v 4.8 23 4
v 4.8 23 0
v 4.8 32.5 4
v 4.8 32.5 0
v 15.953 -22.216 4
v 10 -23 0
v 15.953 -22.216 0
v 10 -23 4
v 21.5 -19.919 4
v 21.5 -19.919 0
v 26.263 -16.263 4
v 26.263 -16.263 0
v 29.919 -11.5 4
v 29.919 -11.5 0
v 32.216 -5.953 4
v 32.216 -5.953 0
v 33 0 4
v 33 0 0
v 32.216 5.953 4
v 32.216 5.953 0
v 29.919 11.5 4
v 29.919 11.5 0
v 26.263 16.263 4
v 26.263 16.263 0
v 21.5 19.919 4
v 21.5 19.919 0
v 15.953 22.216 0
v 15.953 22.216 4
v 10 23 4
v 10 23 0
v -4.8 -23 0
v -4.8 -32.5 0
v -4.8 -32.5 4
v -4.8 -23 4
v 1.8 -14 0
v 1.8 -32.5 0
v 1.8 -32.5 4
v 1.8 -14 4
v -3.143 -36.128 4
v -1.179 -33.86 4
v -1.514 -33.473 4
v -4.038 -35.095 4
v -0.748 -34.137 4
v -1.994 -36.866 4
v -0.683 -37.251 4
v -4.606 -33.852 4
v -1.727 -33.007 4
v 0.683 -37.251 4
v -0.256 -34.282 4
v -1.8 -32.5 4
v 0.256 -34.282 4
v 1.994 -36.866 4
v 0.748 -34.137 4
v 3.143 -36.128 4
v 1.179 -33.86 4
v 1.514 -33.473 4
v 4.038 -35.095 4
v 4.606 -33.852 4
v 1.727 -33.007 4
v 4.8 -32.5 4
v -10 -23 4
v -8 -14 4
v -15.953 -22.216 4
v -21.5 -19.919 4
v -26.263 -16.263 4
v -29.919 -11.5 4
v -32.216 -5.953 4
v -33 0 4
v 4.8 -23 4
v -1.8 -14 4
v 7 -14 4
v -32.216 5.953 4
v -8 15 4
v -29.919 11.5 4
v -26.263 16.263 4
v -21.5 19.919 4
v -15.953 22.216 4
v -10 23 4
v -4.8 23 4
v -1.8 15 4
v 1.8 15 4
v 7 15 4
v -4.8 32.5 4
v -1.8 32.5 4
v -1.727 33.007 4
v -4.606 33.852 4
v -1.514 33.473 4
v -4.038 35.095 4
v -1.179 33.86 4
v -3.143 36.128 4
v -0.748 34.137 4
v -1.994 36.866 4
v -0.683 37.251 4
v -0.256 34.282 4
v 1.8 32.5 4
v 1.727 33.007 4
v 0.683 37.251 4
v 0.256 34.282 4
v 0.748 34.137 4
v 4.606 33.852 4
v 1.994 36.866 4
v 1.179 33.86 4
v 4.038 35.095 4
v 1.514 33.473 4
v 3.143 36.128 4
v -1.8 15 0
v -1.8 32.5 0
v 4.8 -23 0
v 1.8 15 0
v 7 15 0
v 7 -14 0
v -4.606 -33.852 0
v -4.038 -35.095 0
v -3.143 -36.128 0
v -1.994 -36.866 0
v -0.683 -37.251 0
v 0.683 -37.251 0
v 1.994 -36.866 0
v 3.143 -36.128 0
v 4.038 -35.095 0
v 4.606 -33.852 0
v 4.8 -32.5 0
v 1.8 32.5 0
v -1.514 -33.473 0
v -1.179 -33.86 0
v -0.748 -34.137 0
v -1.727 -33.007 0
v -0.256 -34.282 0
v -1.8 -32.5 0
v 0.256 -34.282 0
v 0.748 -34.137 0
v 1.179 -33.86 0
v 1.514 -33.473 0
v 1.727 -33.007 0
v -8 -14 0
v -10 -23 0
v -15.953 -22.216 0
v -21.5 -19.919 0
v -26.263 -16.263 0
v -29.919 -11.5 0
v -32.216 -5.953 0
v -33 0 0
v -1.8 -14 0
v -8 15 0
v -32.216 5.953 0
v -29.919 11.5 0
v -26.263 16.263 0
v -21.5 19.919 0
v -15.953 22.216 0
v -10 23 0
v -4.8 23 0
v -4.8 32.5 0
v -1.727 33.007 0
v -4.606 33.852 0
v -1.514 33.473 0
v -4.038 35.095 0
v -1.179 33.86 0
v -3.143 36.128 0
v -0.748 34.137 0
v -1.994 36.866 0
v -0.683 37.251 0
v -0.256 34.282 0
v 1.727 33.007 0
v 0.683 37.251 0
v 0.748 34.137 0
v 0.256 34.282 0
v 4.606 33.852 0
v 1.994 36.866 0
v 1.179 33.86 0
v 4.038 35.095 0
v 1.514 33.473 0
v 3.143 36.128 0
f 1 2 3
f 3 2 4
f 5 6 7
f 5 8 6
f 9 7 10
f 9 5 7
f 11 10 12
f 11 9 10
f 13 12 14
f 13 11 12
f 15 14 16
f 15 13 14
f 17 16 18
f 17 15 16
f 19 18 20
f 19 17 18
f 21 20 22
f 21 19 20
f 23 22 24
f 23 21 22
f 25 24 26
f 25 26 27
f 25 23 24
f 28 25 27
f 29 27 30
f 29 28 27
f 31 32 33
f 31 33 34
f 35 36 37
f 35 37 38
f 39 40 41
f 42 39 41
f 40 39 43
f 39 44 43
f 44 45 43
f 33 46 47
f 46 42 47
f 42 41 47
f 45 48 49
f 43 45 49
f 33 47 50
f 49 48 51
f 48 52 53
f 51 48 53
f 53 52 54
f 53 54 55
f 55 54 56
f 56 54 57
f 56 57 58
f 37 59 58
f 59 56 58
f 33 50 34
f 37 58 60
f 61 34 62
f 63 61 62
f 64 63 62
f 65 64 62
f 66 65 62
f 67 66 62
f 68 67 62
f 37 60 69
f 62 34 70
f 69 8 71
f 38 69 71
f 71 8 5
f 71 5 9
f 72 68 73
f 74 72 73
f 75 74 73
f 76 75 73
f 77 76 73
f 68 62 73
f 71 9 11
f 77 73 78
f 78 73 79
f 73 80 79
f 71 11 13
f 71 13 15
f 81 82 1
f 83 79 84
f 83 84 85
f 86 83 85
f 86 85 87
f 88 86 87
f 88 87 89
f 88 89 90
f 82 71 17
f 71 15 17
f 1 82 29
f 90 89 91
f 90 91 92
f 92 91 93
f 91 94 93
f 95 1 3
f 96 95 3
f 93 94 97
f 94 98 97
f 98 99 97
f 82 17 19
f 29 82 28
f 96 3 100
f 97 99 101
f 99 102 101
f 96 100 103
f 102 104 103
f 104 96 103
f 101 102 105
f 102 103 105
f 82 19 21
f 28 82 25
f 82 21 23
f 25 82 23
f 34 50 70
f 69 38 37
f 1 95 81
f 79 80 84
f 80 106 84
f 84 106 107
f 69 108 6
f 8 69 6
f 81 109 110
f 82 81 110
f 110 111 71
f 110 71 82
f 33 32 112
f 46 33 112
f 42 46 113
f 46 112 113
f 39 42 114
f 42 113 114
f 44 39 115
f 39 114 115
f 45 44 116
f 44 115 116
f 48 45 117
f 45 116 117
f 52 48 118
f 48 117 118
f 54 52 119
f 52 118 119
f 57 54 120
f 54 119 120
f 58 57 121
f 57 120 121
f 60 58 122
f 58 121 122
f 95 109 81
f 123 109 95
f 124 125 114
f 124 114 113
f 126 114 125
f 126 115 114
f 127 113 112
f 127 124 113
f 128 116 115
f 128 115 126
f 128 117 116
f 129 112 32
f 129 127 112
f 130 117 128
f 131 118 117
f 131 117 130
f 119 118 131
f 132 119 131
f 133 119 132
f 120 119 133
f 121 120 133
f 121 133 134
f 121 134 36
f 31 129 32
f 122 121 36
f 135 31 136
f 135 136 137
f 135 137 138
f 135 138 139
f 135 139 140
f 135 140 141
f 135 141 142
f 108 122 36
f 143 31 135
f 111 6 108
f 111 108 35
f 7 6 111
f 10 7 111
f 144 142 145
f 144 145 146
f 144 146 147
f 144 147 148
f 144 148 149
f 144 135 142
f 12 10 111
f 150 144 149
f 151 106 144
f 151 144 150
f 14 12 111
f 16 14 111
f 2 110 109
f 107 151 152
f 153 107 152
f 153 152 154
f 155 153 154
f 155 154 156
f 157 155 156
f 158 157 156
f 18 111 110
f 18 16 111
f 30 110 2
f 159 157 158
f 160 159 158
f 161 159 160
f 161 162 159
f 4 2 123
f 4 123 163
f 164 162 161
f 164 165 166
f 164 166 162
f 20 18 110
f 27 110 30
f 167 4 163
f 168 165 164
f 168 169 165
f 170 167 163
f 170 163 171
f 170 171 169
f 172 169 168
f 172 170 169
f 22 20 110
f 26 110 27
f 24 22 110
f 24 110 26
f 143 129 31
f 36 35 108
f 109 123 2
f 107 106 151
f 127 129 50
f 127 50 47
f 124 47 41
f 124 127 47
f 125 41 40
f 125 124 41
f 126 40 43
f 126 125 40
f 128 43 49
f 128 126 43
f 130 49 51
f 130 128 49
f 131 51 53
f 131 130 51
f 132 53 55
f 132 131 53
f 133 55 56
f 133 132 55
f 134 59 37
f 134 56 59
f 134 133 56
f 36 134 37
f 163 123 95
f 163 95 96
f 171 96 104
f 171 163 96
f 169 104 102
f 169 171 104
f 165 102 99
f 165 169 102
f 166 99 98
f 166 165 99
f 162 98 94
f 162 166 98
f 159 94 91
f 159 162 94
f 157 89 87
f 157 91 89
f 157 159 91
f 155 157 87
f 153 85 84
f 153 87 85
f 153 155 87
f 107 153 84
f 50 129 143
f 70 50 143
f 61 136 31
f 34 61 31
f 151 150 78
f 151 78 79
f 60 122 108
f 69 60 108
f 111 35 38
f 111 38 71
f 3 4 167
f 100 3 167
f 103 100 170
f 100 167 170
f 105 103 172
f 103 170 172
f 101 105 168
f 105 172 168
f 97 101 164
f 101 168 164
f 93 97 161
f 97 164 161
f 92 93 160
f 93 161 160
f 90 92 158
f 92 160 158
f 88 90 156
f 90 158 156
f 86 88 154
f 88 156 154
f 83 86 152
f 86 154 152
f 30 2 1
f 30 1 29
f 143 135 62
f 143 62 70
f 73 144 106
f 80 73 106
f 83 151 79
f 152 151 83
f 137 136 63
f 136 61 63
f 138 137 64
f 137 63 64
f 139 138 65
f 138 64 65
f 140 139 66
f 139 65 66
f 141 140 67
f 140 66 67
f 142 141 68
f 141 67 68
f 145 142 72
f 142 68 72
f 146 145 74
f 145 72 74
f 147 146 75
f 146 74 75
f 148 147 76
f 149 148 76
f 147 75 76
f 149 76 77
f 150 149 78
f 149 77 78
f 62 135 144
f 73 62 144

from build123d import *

# Parameters (mm, degrees)
BOX002_W          = 3.6
BOX002_H          = 65
BOX002_DEPTH      = 10
CYLINDER004_R     = 1.8
CYLINDER004_DEPTH = 10
ARRAY_Y_COUNT     = 2
ARRAY_Y_PITCH     = 65
BOX004_W          = 15
BOX004_H          = 29
BOX004_DEPTH      = 10
BOX003_W          = 9.6
BOX003_H          = 65
BOX003_DEPTH      = 4
BOX005_W          = 20
BOX005_H          = 46
BOX005_DEPTH      = 4
CYLINDER006_W     = 23
CYLINDER006_H     = 4
CYLINDER006_ANGLE = 180
CYLINDER005_R     = 4.8
CYLINDER005_DEPTH = 4
ARRAY001_Y_COUNT  = 2
ARRAY001_Y_PITCH  = 65


with BuildPart() as cube002:
    # Box002 → Box002 (new body)
    with BuildSketch(Plane(origin=(-1.8, -32.5, 0), x_dir=(1, 0, 0), z_dir=(0, 0, 1))):
        with Locations((1.8, 32.5)):
            Rectangle(BOX002_W, BOX002_H)
    extrude(amount=BOX002_DEPTH)


with BuildPart() as bolt_hole_fusion:
    # Cylinder004 → Cylinder004 (new body)
    with BuildSketch(Plane.XY):
        Circle(CYLINDER004_R)
    extrude(amount=CYLINDER004_DEPTH)

    # Array Y: bolt hole fusion ×2


with BuildPart() as bolt_hole_fusion_1:
    add(bolt_hole_fusion.part)
    with Locations(*[(0, i * ARRAY_Y_PITCH, 0) for i in range(1, ARRAY_Y_COUNT)]):
        add(bolt_hole_fusion.part)


with BuildPart() as bolt_hole_fusion_2:
    # Array placement: moved
    add(bolt_hole_fusion_1.part.moved(Location((0, -32.5, 0))))

    # Fusion003: union Cube002
    add(cube002.part)


with BuildPart() as extract_fusion:
    # Box004 → Box004 (new body)
    with BuildSketch(Plane(origin=(-8, -14, 0), x_dir=(1, 0, 0), z_dir=(0, 0, 1))):
        with Locations((7.5, 14.5)):
            Rectangle(BOX004_W, BOX004_H)
    extrude(amount=BOX004_DEPTH)

    # Fusion005: union bolt hole fusion
    add(bolt_hole_fusion_2.part)


with BuildPart() as wall_cube:
    # Box003 → Box003 (new body)
    with BuildSketch(Plane(origin=(-4.8, -32.5, 0), x_dir=(1, 0, 0), z_dir=(0, 0, 1))):
        with Locations((4.8, 32.5)):
            Rectangle(BOX003_W, BOX003_H)
    extrude(amount=BOX003_DEPTH)


with BuildPart() as intercylinder_fill_cube:
    # Box005 → Box005 (new body)
    with BuildSketch(Plane(origin=(-10, -23, 0), x_dir=(1, 0, 0), z_dir=(0, 0, 1))):
        with Locations((10, 23)):
            Rectangle(BOX005_W, BOX005_H)
    extrude(amount=BOX005_DEPTH)


with BuildPart() as cover_cylinder:
    # Cylinder006 → Cylinder006 (revolve)
    with BuildSketch(Plane(origin=(10, 0, 0), x_dir=(0, -1, 0), z_dir=(-1, 0, 0))):
        with Locations((11.5, 2)):
            Rectangle(CYLINDER006_W, CYLINDER006_H)
    revolve(axis=Axis((10, 0, 0), (0, 0, 1)), revolution_arc=CYLINDER006_ANGLE)


with BuildPart() as part_mirroring:
    # Part__Mirroring: instance of cover cylinder
    add(cover_cylinder.part.mirror(Plane(origin=(0, 0, 0), x_dir=(0, -1, 0), z_dir=(1, 0, 0))))


with BuildPart() as microscope_attachment_cut:
    # Cylinder005 → Cylinder005 (new body)
    with BuildSketch(Plane.XY):
        Circle(CYLINDER005_R)
    extrude(amount=CYLINDER005_DEPTH)

    # Array001 Y: microscope attachment cut ×2


with BuildPart() as microscope_attachment_cut_1:
    add(microscope_attachment_cut.part)
    with Locations(*[(0, i * ARRAY001_Y_PITCH, 0) for i in range(1, ARRAY001_Y_COUNT)]):
        add(microscope_attachment_cut.part)


with BuildPart() as microscope_attachment_cut_2:
    # Array001 placement: moved
    add(microscope_attachment_cut_1.part.moved(Location((0, -32.5, 0))))

    # Fusion004: union wall cube, intercylinder fill cube, Part__Mirroring, cover cylinder
    add(wall_cube.part)
    add(intercylinder_fill_cube.part)
    add(part_mirroring.part)
    add(cover_cylinder.part)

    # Cut001: cut extract fusion
    add(extract_fusion.part, mode=Mode.SUBTRACT)


solid = microscope_attachment_cut_2.part
